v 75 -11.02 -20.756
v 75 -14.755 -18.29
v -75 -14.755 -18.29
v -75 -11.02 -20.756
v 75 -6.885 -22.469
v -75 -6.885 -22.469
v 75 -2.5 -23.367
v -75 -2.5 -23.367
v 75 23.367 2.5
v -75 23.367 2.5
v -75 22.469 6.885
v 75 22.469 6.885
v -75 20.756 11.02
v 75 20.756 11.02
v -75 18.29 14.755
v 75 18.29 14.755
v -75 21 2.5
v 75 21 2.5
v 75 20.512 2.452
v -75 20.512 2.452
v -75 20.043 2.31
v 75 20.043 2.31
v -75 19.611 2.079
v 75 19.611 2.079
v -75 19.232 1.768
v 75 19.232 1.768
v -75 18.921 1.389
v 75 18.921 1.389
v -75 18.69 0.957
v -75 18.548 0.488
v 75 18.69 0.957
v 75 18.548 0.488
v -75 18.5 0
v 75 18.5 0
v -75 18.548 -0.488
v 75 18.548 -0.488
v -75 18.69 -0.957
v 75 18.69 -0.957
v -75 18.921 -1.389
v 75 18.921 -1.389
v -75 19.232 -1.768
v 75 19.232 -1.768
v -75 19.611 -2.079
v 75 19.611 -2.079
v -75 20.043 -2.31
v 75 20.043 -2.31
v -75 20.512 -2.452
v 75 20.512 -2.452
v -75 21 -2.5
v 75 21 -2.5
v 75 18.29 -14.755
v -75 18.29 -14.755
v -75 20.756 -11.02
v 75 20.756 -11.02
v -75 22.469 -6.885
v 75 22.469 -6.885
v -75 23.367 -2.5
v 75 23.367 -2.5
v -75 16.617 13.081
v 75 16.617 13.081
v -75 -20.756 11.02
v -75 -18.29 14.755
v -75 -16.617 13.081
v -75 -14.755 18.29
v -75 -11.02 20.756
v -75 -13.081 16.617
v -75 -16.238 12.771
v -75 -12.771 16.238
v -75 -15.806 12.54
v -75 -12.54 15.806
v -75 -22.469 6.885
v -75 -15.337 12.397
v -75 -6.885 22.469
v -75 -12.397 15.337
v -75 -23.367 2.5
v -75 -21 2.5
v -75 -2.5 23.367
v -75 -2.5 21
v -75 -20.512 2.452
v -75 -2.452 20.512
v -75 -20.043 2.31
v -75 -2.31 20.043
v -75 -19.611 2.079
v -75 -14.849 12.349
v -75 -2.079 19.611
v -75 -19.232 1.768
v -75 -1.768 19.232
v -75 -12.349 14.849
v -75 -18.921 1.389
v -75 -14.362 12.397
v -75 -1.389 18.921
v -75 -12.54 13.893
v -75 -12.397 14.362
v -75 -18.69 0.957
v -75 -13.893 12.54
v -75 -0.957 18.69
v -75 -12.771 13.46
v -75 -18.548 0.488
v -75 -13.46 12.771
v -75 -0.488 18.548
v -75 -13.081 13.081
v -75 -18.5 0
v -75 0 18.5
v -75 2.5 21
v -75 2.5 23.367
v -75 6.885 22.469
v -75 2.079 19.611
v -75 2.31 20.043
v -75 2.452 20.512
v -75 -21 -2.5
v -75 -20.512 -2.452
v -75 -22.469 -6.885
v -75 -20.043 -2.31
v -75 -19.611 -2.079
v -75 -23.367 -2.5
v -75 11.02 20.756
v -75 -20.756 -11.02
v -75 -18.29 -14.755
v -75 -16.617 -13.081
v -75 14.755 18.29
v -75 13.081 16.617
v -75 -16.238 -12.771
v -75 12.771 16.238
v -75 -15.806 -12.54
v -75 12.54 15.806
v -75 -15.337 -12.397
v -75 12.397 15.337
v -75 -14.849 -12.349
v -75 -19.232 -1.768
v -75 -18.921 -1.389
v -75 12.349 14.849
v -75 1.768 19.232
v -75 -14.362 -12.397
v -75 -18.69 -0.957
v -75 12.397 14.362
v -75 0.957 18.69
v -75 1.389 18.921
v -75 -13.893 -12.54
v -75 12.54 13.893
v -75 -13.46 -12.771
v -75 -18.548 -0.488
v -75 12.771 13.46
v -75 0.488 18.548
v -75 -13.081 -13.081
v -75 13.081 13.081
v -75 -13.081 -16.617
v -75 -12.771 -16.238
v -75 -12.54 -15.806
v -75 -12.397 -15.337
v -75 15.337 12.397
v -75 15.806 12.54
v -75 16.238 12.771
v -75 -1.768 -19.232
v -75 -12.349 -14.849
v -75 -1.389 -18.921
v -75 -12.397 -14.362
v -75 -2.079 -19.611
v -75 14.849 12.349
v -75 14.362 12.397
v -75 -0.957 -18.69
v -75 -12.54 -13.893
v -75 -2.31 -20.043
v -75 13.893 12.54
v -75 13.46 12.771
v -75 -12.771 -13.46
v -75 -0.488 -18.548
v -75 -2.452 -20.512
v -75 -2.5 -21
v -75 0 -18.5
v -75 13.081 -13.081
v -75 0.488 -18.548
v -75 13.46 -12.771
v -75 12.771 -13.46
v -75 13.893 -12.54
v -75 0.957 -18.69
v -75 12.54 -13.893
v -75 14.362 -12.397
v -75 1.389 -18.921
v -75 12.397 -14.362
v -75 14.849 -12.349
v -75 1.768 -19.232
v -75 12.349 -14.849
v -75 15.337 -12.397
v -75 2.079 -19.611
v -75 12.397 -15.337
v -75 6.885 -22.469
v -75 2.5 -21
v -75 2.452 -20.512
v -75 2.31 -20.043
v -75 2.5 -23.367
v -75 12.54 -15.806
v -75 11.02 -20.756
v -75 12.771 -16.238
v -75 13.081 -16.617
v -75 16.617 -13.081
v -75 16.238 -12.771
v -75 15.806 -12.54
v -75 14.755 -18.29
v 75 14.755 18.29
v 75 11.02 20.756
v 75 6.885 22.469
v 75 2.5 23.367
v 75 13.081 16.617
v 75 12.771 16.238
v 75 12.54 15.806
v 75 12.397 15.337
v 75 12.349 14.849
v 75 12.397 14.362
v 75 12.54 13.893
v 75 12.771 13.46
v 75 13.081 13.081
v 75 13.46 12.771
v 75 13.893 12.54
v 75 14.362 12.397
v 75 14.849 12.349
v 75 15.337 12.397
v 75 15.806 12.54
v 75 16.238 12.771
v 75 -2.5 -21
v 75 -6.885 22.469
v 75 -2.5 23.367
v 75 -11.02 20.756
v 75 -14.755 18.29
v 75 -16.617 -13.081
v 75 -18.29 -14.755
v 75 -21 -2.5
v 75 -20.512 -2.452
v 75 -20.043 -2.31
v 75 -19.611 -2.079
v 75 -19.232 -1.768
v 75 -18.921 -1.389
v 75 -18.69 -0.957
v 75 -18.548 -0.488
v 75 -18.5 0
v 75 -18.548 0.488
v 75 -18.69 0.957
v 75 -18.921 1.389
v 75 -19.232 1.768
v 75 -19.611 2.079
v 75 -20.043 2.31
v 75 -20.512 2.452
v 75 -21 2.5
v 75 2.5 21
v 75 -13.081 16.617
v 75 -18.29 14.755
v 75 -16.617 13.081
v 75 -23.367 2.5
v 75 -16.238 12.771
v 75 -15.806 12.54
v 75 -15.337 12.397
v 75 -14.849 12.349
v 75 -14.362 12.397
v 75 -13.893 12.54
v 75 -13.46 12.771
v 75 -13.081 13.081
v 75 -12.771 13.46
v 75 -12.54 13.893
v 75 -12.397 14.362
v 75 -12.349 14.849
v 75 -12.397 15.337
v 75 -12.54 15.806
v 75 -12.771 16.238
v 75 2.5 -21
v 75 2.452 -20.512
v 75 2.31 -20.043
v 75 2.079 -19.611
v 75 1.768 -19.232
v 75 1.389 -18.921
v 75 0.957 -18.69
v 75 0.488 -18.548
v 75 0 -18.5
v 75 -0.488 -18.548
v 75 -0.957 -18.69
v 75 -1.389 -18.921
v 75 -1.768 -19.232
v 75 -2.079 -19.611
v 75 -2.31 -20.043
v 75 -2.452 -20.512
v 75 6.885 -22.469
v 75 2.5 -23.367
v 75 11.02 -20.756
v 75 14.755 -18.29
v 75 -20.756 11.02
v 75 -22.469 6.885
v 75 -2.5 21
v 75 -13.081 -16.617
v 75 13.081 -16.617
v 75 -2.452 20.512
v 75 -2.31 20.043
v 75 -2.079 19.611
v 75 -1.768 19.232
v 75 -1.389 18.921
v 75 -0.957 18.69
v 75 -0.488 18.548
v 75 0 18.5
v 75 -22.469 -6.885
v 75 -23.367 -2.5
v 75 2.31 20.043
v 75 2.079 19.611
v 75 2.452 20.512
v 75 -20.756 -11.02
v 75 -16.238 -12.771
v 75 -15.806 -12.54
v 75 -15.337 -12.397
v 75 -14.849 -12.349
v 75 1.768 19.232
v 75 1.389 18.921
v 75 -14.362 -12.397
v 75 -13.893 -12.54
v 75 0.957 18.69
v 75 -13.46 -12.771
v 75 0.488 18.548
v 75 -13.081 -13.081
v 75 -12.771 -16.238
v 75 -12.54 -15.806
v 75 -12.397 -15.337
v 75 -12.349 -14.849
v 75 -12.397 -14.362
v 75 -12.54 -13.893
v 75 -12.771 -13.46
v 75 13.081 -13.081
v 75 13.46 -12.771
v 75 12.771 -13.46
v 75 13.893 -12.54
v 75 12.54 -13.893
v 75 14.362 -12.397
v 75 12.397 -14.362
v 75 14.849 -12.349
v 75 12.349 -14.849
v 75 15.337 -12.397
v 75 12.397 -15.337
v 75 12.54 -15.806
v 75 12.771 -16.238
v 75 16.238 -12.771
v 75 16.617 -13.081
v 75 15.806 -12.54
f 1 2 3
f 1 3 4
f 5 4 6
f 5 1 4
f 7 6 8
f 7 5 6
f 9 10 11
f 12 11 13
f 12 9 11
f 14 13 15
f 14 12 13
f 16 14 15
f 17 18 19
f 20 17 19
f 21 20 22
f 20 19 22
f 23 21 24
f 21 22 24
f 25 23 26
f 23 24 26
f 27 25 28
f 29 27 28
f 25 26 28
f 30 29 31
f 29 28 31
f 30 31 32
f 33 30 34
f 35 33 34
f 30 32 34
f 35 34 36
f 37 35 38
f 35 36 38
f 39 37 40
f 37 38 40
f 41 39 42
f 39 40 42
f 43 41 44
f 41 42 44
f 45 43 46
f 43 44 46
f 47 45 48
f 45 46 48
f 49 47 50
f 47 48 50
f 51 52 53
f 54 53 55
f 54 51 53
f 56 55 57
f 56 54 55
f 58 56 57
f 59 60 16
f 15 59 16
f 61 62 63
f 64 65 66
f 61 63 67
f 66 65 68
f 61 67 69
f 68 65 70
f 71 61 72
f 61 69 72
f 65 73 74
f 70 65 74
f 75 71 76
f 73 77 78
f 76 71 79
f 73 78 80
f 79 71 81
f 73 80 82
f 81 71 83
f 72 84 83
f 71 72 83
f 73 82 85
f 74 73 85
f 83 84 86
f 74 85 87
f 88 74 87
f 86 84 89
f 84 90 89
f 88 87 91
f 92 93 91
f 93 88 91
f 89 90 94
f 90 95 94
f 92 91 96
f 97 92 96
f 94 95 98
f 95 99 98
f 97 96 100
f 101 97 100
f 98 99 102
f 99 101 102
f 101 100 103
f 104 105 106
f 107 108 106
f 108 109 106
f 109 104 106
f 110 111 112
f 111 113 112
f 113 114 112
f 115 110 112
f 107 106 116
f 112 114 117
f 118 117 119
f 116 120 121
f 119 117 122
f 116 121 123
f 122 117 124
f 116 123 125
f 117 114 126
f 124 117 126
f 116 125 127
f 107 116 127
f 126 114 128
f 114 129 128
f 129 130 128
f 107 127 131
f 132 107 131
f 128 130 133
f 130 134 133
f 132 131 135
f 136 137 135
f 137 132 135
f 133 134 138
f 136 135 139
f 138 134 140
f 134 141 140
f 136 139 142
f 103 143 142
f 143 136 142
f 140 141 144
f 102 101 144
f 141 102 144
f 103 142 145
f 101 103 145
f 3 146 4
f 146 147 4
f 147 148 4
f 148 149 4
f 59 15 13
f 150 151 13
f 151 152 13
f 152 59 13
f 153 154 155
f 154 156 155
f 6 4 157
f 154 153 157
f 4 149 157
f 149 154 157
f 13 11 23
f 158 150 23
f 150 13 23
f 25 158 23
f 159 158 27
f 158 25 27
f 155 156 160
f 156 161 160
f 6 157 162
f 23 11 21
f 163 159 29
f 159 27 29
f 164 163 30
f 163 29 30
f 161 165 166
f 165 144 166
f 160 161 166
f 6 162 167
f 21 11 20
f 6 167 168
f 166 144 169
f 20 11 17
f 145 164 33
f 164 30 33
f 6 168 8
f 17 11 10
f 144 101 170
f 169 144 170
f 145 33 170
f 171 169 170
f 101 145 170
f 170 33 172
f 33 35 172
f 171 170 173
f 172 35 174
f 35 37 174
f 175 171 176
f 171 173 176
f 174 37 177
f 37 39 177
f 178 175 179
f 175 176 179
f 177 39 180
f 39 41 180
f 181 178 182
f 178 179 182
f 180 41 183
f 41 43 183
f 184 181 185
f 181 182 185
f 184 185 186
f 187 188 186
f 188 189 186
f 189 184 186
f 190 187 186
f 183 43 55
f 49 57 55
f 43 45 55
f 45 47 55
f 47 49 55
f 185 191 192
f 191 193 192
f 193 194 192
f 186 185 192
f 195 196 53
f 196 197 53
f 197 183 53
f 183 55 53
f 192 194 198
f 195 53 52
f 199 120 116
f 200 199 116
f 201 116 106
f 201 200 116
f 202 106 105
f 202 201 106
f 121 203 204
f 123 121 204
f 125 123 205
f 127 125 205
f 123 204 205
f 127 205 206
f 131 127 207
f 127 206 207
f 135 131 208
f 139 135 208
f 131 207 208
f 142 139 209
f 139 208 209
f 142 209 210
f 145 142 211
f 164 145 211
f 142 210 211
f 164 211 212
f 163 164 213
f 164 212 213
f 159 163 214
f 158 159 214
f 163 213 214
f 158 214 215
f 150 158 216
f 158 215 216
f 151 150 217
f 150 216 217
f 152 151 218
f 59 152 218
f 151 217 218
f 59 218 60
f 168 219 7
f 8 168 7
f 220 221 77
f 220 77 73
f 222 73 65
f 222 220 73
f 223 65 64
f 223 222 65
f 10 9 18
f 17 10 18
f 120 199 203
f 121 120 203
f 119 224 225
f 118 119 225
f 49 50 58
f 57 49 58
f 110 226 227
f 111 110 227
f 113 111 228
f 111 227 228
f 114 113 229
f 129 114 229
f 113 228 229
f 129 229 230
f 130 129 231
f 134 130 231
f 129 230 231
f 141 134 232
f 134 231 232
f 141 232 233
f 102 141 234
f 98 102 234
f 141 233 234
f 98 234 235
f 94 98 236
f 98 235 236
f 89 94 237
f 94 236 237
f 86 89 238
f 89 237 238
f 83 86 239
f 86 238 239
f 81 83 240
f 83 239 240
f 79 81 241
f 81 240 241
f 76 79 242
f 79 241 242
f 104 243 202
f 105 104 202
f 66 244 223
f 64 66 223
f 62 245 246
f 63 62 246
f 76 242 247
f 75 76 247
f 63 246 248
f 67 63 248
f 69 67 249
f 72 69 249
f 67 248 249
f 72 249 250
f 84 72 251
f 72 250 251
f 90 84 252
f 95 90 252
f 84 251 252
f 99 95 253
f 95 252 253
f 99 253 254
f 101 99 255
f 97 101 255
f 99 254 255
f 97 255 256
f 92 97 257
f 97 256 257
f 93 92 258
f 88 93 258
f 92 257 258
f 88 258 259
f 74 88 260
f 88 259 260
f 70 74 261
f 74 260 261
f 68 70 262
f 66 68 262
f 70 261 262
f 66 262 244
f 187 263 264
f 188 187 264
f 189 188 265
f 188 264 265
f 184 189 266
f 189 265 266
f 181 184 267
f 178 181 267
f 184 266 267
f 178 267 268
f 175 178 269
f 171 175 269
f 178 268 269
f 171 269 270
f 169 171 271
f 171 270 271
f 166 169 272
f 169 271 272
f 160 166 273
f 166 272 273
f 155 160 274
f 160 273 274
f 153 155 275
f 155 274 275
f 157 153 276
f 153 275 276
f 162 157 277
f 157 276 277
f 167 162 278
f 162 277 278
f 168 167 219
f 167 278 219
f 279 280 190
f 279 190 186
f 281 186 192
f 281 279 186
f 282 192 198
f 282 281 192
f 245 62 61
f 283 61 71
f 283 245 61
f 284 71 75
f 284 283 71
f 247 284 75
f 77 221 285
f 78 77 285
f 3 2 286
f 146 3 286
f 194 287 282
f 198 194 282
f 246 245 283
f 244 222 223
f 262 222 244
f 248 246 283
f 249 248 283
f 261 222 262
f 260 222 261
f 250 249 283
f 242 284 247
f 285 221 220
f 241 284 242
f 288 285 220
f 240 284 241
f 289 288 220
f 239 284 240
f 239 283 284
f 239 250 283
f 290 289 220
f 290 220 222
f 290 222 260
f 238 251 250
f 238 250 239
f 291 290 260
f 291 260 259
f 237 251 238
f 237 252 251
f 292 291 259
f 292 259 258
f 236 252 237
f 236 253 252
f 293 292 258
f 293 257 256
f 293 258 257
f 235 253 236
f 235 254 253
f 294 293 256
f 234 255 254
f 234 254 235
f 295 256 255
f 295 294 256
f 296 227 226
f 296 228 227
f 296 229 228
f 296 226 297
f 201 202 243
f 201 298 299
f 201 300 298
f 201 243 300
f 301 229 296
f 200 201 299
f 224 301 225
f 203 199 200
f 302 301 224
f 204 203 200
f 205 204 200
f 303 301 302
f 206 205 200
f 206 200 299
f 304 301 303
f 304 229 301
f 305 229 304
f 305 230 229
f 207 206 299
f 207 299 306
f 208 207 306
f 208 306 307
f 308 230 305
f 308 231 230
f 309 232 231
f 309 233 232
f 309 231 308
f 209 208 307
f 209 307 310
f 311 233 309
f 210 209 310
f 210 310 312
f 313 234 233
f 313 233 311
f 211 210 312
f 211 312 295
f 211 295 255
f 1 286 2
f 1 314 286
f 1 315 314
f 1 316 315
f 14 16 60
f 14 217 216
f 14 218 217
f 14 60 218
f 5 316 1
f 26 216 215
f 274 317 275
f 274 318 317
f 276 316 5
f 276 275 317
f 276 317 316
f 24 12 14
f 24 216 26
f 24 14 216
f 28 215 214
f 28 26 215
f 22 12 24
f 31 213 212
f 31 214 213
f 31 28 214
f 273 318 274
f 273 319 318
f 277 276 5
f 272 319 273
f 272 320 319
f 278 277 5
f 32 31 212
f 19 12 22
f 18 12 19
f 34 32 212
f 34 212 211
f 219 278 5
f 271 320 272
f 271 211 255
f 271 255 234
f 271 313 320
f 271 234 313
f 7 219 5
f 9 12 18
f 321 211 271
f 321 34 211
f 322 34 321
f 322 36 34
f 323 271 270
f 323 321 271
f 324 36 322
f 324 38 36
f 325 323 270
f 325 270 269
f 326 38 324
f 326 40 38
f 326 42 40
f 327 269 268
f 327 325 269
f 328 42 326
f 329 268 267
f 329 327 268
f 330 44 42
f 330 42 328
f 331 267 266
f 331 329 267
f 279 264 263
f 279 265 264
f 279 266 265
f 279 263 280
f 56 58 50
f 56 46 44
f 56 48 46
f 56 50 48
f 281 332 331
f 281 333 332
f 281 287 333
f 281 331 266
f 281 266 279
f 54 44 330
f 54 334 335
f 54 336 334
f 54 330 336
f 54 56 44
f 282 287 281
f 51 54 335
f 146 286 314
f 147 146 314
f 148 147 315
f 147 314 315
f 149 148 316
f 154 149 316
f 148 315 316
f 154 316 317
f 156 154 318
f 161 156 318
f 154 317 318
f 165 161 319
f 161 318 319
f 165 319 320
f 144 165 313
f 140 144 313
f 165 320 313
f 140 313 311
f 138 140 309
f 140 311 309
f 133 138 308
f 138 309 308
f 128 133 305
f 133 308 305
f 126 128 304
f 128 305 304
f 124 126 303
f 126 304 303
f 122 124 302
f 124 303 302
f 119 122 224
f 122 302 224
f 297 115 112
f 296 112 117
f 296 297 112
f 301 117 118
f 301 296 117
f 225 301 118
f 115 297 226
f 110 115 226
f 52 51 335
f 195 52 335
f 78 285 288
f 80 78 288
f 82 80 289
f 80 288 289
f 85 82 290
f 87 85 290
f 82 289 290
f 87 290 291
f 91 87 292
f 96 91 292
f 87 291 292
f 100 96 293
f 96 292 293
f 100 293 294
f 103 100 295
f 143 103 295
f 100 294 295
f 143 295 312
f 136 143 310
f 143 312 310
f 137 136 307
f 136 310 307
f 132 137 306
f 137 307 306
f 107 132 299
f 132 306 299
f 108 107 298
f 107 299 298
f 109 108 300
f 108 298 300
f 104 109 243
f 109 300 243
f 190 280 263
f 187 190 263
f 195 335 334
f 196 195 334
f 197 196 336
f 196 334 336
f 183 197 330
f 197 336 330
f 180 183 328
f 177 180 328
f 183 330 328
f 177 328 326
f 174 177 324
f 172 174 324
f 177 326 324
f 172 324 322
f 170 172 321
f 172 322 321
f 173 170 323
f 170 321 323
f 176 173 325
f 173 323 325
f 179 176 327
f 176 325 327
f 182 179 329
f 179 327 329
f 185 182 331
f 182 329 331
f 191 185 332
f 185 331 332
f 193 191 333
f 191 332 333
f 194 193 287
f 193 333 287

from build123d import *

# Parameters (mm, degrees)
SKETCH_1_R               = 23.5
EXTRUDE_1_DEPTH          = 75
CUT_EXTRUDE_1_DEPTH      = 154.637560512
PATTERN_CIRCULAR_2_COUNT = 8


with BuildPart() as part:
    # 草图1 → 凸台-拉伸1 (new, symmetric)
    with BuildSketch(Plane(origin=(0, 0, 0), x_dir=(0, 0, -1), z_dir=(1, 0, 0))):
        Circle(SKETCH_1_R)
    extrude(amount=EXTRUDE_1_DEPTH, both=True)

    # 草图2 → 切除-拉伸1 (cut, through all)
    with BuildSketch(Plane(origin=(75, 0, 0), x_dir=(0, 0, -1), z_dir=(1, 0, 0))):
        with BuildLine():
            ThreePointArc((-2.5, 21), (0, 18.5), (2.5, 21))
            ThreePointArc((2.5, 21), (1.767766953, 22.767766953), (0, 23.5))
            ThreePointArc((0, 23.5), (-1.251777149, 23.46663704), (-2.5, 23.366642891))
            Line((-2.5, 23.366642891), (-2.5, 21))
        make_face()
        with BuildLine():
            ThreePointArc((0, 23.5), (1.767766953, 22.767766953), (2.5, 21))
            Line((2.5, 21), (2.5, 23.366642891))
            ThreePointArc((2.5, 23.366642891), (1.251777149, 23.46663704), (0, 23.5))
        make_face()
    cut_extrude_1 = extrude(amount=-CUT_EXTRUDE_1_DEPTH, mode=Mode.SUBTRACT)

    # 阵列(圆周)2: 切除-拉伸1 ×8 about axis
    pattern_circular_2_axis = Axis((0, 0, 0), (1, 0, 0))
    for i in range(1, PATTERN_CIRCULAR_2_COUNT):
        add(cut_extrude_1.rotate(pattern_circular_2_axis, i * 360 / PATTERN_CIRCULAR_2_COUNT), mode=Mode.SUBTRACT)


solid = part.part
